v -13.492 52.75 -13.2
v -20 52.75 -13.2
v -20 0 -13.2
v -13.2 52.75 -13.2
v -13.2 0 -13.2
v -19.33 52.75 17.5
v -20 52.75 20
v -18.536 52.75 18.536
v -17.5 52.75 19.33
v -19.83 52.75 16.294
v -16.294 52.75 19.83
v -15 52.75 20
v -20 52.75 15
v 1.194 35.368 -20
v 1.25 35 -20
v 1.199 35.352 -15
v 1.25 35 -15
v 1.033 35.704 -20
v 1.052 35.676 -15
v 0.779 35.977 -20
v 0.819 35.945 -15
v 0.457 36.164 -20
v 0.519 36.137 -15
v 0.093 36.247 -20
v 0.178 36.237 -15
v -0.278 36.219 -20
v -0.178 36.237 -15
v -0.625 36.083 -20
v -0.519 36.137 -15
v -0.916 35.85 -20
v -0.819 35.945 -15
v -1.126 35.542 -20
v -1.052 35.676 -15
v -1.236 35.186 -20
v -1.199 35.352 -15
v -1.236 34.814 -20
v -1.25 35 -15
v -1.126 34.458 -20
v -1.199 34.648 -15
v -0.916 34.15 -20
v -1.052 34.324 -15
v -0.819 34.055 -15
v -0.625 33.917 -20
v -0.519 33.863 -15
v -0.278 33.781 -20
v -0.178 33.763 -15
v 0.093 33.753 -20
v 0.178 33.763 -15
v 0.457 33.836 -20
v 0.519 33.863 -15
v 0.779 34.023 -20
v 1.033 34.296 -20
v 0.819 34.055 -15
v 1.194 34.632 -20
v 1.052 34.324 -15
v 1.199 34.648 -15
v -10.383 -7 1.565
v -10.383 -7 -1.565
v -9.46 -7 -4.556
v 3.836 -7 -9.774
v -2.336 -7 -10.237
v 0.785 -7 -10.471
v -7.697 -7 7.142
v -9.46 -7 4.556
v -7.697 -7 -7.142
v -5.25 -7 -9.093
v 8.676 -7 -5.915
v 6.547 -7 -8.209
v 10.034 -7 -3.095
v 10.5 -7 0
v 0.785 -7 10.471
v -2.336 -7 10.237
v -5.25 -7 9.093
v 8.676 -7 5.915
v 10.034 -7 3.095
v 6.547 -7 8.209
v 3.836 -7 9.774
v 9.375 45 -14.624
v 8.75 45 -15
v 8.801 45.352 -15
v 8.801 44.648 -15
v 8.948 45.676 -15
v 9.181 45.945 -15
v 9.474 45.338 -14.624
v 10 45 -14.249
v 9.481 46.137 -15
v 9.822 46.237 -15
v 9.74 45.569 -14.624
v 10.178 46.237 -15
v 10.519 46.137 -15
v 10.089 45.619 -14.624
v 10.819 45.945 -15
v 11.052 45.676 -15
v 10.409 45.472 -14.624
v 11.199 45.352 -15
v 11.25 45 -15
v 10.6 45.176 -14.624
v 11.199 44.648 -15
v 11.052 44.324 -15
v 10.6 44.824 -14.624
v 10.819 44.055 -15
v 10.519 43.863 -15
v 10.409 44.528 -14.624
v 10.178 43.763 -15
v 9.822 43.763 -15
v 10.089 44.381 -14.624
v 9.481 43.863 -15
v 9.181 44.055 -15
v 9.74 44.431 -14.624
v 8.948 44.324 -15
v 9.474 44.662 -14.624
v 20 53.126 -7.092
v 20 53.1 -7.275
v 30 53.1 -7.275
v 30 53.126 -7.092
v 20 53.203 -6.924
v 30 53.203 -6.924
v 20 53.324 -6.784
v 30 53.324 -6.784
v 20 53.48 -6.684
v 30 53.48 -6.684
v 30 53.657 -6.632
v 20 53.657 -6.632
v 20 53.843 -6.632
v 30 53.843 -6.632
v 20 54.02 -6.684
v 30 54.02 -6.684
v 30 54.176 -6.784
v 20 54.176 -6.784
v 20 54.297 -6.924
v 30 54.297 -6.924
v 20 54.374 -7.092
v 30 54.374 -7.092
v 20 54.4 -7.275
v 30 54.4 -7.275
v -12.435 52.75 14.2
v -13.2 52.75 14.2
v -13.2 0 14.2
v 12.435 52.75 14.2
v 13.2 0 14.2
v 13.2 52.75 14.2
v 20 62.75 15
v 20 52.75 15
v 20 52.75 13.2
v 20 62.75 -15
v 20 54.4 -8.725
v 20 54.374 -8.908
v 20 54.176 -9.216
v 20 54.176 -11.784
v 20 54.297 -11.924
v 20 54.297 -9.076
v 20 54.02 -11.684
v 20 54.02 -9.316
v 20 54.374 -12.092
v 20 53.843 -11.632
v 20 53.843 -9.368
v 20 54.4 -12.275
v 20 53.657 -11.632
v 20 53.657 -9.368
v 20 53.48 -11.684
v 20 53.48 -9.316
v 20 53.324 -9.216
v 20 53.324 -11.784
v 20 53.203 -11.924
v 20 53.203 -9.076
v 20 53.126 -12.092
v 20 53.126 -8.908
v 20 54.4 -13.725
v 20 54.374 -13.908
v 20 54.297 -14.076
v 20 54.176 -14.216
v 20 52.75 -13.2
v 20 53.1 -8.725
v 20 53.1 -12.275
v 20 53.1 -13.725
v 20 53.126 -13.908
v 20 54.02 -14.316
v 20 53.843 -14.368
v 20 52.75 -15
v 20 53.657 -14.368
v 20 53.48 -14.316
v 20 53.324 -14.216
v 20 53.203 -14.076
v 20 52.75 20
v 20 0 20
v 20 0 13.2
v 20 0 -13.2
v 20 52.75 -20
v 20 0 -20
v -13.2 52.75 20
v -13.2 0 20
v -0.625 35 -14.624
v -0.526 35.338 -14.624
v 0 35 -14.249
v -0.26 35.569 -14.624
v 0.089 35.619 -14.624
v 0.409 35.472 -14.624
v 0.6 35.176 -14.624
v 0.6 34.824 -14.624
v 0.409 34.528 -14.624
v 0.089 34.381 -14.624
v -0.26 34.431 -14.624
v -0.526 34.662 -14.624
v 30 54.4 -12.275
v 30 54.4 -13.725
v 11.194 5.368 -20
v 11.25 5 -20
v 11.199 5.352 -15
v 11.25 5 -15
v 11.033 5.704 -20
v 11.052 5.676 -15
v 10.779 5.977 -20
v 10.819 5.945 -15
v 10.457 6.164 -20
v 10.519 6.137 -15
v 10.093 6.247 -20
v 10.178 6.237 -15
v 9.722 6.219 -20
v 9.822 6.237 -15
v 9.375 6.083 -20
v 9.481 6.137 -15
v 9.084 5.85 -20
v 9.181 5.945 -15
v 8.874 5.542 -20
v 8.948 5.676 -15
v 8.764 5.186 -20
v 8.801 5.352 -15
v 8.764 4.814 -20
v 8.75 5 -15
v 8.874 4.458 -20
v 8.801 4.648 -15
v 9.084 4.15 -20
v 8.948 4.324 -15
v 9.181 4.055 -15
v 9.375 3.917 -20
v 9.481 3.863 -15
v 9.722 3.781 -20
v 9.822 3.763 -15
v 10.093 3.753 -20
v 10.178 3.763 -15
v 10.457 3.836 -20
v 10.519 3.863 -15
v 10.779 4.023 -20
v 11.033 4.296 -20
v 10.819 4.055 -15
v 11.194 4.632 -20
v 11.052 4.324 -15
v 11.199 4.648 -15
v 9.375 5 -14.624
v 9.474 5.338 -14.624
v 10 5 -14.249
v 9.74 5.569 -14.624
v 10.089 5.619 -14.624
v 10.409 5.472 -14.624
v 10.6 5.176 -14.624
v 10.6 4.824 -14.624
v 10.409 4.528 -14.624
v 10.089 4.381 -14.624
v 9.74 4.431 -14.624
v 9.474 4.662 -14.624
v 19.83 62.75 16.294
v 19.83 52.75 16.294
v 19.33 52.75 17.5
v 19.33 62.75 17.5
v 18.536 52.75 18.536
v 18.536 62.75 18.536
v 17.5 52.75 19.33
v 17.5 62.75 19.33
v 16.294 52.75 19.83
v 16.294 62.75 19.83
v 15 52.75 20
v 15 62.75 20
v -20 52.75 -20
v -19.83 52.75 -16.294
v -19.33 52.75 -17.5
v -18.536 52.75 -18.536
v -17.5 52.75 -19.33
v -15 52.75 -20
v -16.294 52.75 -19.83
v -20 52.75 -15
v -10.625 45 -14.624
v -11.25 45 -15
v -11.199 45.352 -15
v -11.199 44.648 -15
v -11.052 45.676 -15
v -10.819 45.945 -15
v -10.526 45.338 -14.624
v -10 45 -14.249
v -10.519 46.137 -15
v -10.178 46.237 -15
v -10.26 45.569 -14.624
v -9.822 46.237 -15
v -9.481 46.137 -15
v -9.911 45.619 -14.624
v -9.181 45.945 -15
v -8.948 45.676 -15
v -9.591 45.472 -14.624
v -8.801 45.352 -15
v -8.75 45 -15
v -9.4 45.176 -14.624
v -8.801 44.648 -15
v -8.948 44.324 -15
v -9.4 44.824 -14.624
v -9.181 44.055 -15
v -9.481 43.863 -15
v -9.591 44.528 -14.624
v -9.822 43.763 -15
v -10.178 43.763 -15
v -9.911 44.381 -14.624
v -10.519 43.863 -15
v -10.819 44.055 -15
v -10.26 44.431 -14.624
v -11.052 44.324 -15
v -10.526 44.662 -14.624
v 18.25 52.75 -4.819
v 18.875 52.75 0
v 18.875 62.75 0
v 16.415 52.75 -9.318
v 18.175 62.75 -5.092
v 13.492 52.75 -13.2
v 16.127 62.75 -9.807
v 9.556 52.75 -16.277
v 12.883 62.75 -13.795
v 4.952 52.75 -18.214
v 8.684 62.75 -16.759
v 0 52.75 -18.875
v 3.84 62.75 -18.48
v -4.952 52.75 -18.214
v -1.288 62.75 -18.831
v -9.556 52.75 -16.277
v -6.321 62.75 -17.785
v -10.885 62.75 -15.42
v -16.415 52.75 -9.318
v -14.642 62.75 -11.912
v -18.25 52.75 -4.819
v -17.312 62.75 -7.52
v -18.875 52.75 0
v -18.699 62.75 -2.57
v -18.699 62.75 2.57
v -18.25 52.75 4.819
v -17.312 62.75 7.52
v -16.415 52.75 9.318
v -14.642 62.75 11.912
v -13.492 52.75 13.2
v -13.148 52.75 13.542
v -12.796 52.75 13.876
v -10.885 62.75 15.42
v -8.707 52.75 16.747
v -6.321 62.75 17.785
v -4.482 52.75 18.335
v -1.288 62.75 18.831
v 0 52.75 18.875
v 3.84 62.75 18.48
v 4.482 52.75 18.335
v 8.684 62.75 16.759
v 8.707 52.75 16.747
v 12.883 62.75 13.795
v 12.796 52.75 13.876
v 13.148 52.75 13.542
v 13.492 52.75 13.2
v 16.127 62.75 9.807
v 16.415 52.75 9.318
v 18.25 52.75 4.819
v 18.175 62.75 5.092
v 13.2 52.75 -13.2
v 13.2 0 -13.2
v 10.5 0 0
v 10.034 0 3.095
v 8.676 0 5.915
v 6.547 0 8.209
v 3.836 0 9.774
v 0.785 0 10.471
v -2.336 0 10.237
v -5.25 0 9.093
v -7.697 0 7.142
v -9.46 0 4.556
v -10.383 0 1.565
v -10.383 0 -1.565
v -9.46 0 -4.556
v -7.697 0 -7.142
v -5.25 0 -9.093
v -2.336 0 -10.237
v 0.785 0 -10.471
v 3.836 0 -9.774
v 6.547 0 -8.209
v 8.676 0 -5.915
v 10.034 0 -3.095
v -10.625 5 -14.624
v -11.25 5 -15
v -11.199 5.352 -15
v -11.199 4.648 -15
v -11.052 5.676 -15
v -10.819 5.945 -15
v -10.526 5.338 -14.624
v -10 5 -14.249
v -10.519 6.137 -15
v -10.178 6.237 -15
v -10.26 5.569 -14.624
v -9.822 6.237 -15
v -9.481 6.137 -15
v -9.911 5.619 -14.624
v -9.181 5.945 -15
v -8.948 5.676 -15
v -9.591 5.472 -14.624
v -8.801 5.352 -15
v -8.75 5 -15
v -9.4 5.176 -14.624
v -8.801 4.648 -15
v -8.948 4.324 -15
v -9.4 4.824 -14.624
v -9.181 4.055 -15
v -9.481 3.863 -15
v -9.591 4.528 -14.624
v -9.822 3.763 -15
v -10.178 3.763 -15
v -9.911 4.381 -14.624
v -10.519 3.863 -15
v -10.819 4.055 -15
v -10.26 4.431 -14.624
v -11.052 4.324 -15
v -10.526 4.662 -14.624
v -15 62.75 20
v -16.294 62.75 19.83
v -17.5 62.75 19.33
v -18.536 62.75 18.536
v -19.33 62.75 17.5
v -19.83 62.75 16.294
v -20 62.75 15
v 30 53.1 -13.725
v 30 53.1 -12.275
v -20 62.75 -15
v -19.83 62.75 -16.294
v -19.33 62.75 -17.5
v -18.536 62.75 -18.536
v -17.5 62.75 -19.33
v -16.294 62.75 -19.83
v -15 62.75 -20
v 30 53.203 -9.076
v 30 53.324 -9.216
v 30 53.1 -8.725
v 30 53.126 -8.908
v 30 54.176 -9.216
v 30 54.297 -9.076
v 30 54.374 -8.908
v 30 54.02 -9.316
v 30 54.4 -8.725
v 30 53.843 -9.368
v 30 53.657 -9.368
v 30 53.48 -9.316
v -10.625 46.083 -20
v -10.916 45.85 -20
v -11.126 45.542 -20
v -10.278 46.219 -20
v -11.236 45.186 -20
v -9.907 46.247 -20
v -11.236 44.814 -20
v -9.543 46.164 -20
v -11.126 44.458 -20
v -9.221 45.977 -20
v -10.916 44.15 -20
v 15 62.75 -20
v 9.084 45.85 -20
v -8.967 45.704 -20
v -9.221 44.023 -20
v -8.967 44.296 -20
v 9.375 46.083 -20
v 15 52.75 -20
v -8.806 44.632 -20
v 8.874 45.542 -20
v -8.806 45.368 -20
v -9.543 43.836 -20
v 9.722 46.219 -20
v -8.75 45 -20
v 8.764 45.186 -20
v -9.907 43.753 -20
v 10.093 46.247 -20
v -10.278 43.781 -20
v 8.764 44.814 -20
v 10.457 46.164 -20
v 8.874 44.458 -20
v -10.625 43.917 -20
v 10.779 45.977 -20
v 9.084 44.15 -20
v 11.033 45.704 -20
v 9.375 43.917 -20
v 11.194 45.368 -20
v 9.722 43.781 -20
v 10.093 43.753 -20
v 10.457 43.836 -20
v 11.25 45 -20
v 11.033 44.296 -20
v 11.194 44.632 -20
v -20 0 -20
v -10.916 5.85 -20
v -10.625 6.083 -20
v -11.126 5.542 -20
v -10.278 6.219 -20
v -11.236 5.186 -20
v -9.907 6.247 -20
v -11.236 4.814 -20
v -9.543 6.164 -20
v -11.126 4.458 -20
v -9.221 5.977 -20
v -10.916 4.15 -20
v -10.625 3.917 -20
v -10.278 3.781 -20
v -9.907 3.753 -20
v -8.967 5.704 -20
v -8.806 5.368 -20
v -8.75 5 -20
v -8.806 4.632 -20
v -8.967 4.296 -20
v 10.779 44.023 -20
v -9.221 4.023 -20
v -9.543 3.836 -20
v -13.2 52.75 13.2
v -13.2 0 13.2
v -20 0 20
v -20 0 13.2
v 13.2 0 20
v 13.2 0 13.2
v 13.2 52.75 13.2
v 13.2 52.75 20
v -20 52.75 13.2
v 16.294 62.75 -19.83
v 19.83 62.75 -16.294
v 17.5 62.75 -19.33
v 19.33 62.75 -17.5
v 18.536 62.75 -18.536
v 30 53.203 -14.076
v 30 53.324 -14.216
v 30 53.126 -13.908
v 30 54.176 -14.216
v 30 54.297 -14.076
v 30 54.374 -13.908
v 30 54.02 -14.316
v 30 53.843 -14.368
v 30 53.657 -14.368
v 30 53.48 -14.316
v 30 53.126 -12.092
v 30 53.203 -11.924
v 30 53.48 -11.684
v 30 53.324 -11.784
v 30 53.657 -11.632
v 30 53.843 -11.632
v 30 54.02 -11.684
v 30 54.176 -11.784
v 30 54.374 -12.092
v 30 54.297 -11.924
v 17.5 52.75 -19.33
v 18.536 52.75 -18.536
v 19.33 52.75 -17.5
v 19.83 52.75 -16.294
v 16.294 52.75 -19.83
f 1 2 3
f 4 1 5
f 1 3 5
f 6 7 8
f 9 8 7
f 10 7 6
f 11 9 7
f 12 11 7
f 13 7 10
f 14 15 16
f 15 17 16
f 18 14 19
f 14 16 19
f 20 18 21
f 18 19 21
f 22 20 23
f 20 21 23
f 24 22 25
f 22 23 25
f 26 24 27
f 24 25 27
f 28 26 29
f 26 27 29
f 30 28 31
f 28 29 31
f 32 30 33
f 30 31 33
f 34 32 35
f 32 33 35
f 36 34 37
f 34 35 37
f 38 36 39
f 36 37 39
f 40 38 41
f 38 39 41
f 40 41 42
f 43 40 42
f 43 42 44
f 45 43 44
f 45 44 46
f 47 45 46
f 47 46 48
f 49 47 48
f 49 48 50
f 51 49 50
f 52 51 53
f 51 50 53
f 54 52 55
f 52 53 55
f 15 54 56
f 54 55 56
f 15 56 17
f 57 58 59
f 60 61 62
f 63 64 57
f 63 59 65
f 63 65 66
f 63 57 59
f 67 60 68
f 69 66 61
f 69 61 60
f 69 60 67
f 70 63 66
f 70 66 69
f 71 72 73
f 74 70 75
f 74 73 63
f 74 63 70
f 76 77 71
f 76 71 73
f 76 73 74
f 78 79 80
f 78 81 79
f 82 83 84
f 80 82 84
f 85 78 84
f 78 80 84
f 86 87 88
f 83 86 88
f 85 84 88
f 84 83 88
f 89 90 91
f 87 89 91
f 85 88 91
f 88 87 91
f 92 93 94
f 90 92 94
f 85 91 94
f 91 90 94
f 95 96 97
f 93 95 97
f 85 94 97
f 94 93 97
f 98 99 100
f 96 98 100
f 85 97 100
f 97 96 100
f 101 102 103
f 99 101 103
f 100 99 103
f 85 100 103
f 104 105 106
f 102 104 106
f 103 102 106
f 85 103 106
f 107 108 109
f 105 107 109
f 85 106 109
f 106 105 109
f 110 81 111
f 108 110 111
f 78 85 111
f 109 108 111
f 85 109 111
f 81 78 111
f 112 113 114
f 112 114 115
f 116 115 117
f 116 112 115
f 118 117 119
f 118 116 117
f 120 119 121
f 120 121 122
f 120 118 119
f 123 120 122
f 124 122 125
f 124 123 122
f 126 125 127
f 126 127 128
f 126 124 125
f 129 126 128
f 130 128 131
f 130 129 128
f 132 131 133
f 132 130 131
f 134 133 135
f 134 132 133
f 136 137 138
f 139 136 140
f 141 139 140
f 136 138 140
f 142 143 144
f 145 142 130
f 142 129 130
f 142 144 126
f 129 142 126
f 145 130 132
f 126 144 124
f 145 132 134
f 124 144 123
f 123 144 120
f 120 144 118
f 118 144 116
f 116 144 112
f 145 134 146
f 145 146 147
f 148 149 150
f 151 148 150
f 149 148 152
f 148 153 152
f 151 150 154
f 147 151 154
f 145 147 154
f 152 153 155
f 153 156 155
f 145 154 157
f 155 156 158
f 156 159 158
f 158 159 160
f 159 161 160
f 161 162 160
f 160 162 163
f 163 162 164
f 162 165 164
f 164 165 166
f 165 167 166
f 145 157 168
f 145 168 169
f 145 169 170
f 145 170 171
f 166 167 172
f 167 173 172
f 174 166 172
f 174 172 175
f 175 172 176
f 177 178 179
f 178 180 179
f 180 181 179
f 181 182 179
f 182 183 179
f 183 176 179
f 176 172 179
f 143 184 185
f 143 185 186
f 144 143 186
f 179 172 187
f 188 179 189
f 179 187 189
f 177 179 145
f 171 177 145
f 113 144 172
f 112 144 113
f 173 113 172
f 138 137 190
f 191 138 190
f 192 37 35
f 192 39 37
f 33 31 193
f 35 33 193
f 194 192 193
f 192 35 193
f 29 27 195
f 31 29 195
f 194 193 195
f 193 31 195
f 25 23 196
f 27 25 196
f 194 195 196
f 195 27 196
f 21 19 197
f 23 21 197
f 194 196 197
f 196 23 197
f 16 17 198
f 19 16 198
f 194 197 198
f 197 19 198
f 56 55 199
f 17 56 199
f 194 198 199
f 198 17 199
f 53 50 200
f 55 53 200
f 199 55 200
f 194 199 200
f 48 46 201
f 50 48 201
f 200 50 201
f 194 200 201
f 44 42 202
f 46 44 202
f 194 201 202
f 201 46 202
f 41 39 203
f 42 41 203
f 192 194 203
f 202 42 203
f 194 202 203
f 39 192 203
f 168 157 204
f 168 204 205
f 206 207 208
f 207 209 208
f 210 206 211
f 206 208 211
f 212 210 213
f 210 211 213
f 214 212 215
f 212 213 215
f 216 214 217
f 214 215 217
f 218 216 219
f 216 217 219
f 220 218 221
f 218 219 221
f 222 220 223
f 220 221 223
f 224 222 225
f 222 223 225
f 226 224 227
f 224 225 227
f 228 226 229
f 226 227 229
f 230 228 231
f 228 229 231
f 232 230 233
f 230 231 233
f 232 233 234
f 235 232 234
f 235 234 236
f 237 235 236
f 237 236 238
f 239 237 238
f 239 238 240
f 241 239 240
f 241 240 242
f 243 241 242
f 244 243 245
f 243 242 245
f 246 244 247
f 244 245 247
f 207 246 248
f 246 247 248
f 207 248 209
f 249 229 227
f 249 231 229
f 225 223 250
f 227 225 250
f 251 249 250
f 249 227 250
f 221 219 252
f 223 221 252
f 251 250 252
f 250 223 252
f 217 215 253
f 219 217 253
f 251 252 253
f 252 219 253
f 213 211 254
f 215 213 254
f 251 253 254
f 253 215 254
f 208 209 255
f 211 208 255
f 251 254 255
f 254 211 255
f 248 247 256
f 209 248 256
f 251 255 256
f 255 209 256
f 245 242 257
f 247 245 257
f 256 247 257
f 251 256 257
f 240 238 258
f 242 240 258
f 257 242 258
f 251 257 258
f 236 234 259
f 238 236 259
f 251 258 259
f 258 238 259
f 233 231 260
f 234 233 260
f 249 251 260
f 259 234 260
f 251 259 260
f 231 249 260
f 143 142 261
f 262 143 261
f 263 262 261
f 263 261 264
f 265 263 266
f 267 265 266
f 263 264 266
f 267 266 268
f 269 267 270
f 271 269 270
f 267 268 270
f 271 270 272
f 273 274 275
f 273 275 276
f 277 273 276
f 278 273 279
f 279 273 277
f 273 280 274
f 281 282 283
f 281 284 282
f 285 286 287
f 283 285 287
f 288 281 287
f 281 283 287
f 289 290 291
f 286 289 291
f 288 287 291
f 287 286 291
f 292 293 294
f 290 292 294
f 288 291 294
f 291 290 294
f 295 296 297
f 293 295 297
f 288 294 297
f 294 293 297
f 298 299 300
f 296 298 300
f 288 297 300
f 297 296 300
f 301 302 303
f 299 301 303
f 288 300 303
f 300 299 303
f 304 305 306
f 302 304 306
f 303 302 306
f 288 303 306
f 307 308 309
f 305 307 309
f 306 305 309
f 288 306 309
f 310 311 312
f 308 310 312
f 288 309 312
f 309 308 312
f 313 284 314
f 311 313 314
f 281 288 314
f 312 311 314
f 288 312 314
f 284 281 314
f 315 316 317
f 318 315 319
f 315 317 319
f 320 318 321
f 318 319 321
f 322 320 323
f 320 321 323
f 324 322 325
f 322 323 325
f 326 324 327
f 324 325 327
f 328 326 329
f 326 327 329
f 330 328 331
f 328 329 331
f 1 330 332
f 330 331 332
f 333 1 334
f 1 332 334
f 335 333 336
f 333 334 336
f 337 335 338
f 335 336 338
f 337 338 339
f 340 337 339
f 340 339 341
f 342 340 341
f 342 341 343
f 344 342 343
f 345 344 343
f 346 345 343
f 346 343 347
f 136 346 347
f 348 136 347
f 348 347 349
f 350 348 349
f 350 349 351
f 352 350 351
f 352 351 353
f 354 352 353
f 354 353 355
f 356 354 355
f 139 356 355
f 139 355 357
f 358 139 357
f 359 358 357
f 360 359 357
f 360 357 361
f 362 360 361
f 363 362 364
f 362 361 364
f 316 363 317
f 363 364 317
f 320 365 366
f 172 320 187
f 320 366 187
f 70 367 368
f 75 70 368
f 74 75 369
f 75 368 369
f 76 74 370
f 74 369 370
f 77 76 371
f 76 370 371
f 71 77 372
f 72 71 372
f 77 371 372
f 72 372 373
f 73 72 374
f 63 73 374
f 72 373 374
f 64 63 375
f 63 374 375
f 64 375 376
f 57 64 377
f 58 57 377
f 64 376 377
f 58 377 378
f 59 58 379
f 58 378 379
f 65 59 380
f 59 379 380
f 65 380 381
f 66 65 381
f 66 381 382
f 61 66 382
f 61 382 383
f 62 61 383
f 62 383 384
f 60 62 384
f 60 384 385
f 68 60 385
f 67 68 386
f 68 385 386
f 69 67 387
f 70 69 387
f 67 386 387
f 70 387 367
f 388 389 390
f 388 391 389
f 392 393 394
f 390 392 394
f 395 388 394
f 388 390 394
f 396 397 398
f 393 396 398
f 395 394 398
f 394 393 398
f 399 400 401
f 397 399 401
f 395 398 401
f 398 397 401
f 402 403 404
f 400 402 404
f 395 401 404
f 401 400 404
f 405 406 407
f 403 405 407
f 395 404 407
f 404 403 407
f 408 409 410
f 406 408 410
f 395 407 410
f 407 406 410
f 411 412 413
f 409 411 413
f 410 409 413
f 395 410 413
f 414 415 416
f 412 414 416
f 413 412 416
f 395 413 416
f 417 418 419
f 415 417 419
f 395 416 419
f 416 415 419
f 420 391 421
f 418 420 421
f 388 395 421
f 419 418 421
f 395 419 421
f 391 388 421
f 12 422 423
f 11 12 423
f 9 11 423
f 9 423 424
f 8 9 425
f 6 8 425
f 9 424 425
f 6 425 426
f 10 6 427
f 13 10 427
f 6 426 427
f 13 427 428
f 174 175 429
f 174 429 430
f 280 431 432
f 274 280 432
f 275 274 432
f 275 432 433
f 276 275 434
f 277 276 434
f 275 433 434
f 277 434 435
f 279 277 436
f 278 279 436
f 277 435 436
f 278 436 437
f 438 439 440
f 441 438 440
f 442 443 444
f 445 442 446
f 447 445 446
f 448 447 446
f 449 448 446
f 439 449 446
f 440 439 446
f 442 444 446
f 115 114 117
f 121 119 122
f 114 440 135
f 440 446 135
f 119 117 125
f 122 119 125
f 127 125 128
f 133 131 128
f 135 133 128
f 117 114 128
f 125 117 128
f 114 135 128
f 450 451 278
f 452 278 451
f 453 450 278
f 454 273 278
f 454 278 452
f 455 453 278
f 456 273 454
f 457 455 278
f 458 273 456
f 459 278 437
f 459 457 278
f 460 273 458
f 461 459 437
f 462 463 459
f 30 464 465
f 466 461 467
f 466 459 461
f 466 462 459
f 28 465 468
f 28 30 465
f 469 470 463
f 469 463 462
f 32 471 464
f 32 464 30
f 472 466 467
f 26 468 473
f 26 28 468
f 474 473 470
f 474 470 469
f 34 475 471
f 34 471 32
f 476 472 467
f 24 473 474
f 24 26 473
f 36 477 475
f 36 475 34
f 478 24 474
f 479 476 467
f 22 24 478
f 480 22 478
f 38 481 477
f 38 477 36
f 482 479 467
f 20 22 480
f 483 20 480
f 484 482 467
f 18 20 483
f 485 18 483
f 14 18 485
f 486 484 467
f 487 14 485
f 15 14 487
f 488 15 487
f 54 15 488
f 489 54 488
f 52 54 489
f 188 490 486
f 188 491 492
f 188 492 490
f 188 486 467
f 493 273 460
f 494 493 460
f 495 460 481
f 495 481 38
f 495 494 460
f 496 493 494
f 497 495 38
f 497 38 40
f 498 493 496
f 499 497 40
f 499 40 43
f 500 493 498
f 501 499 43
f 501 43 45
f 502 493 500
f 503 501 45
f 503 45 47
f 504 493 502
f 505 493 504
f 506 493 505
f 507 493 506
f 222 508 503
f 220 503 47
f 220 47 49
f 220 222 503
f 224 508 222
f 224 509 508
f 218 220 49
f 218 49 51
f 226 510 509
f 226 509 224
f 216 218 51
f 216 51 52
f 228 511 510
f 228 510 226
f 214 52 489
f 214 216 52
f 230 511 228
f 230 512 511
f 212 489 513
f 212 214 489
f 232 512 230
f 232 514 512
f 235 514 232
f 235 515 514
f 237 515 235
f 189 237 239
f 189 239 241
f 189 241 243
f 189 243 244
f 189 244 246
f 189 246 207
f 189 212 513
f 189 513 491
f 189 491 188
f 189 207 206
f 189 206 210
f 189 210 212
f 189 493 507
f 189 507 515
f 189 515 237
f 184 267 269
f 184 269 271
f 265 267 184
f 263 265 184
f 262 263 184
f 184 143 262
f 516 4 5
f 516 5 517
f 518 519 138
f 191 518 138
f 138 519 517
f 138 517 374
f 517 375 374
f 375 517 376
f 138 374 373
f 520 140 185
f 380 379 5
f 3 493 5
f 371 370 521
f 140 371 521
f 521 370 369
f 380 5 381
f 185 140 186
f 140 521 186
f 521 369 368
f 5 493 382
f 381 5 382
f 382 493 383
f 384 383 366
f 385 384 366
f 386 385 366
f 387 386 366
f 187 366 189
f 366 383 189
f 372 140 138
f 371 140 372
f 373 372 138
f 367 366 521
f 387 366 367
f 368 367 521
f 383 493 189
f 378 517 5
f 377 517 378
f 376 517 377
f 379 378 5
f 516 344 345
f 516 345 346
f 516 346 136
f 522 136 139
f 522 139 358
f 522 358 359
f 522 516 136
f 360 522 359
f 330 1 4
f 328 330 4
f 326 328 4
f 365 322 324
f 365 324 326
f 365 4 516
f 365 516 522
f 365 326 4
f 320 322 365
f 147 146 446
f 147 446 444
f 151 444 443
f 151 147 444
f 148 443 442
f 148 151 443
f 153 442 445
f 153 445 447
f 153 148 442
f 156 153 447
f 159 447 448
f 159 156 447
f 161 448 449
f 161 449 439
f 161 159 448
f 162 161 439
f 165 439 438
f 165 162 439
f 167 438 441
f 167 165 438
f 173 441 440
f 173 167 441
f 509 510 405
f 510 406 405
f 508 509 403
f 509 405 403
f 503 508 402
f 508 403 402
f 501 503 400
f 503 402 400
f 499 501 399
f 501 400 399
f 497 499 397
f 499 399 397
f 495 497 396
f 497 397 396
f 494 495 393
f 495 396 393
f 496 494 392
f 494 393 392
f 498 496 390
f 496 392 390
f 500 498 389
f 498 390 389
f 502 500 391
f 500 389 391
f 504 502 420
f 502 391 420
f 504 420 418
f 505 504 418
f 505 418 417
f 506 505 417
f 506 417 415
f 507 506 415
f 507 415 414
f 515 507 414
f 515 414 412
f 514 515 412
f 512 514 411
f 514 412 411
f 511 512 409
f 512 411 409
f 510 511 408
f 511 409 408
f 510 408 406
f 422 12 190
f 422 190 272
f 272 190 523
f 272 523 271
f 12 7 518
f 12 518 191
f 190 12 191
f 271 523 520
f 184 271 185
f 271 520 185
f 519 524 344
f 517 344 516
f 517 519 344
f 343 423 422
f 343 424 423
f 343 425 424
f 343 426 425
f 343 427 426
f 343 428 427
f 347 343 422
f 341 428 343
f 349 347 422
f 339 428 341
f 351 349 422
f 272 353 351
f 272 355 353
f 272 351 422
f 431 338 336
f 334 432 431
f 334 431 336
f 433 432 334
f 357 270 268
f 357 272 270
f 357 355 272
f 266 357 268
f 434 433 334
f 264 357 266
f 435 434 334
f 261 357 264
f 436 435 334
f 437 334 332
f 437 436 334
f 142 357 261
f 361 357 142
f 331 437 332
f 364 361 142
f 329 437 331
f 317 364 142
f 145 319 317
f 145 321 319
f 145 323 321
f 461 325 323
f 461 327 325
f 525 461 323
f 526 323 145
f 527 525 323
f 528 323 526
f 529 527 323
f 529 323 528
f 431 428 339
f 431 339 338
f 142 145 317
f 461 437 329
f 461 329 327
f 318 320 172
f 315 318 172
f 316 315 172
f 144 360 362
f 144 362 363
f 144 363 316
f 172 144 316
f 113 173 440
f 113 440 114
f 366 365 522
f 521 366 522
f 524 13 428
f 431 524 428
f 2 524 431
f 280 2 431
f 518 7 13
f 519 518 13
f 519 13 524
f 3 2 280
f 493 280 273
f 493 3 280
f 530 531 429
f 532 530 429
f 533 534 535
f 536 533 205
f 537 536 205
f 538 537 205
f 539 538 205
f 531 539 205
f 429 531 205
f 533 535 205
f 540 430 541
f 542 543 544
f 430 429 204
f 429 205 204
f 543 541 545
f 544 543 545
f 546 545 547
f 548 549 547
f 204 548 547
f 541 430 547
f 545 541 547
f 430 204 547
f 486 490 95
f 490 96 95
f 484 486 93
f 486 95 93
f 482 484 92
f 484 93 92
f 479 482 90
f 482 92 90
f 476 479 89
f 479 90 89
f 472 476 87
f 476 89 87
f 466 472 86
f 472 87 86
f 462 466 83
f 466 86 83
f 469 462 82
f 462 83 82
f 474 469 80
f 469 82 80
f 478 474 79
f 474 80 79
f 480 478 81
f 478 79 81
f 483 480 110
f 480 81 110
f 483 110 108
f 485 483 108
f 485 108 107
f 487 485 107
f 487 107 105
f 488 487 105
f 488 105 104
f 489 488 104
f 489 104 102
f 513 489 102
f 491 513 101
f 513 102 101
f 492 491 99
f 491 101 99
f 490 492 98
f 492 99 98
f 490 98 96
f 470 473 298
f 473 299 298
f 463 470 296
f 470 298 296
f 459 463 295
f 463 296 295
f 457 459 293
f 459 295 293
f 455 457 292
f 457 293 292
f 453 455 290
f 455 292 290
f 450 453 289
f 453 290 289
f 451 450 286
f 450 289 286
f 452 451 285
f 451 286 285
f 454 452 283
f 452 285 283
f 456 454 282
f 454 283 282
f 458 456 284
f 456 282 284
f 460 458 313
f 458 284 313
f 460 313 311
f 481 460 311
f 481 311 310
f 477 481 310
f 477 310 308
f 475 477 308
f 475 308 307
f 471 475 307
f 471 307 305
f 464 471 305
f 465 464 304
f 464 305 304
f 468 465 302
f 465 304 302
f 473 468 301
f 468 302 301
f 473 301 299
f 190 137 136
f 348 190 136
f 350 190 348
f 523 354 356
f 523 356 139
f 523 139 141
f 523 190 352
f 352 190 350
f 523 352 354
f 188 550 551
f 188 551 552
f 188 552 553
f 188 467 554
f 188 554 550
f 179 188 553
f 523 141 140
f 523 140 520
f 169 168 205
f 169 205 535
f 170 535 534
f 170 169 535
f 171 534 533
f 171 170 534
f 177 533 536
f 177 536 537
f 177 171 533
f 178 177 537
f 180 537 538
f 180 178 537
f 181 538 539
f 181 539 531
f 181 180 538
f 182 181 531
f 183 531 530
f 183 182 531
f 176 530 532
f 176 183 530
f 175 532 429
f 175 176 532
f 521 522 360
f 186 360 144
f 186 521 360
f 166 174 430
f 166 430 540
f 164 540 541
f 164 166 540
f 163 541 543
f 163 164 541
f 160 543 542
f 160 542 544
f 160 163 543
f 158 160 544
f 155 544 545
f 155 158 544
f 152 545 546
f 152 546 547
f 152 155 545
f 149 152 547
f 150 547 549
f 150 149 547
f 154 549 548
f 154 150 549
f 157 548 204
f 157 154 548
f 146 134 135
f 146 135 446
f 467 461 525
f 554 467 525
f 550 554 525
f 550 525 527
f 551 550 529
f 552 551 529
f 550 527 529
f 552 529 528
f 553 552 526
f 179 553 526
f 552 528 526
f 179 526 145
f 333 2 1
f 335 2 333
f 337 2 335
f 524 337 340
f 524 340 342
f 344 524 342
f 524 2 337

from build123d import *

# Parameters (mm, degrees)
SKETCH1_W                 = 40
SKETCH1_H                 = 40
BOSS_EXTRUDE1_DEPTH       = 62.75
SKETCH2_R                 = 18.875
CUT_EXTRUDE1_DEPTH        = 10
SKETCH4_R                 = 10.5
BOSS_EXTRUDE2_DEPTH       = 7
SKETCH5_W                 = 26.4
SKETCH5_H                 = 5.8
SKETCH5_W_2               = 6.8
SKETCH5_H_2               = 26.4
CUT_EXTRUDE2_DEPTH        = 52.75
M3X0_5_TAPPED_HOLE1_D     = 2.5
M3X0_5_TAPPED_HOLE1_DEPTH = 5
M3X0_5_TAPPED_HOLE1_TIP   = 0.751075774
BOSS_EXTRUDE3_DEPTH       = 10


with BuildPart() as part:
    # Sketch1 → Boss-Extrude1 (new body)
    with BuildSketch(Plane(origin=(0, 0, 0), x_dir=(1, 0, 0), z_dir=(0, 1, 0))):
        Rectangle(SKETCH1_W, SKETCH1_H)
    extrude(amount=BOSS_EXTRUDE1_DEPTH)

    # Sketch2 → Cut-Extrude1 (cut)
    with BuildSketch(Plane(origin=(0, 62.75, 0), x_dir=(1, 0, 0), z_dir=(0, 1, 0))):
        Circle(SKETCH2_R)
        with BuildLine():
            ThreePointArc((-15, -20), (-18.535533906, -18.535533906), (-20, -15))
            Line((-20, -15), (-20, -20))
            Line((-20, -20), (-15, -20))
        make_face()
        with BuildLine():
            ThreePointArc((20, -15), (18.535533906, -18.535533906), (15, -20))
            Line((15, -20), (20, -20))
            Line((20, -20), (20, -15))
        make_face()
        with BuildLine():
            Line((20, 20), (15, 20))
            ThreePointArc((15, 20), (18.535533906, 18.535533906), (20, 15))
            Line((20, 15), (20, 20))
        make_face()
        with BuildLine():
            Line((-15, 20), (-20, 20))
            Line((-20, 20), (-20, 15))
            ThreePointArc((-20, 15), (-18.535533906, 18.535533906), (-15, 20))
        make_face()
    extrude(amount=-CUT_EXTRUDE1_DEPTH, mode=Mode.SUBTRACT)

    # Sketch4 → Boss-Extrude2 (add)
    with BuildSketch(Plane.XZ):
        Circle(SKETCH4_R)
    extrude(amount=BOSS_EXTRUDE2_DEPTH)

    # Sketch5 → Cut-Extrude2 (cut)
    with BuildSketch(Plane.XZ):
        with Locations((0, 17.1)):
            Rectangle(SKETCH5_W, SKETCH5_H)
        with Locations((16.6, 0)):
            Rectangle(SKETCH5_W_2, SKETCH5_H_2)
        with Locations((-16.6, 0)):
            Rectangle(SKETCH5_W_2, SKETCH5_H_2)
    extrude(amount=-CUT_EXTRUDE2_DEPTH, mode=Mode.SUBTRACT)

    # M3x0.5 Tapped Hole1
    with Locations(Plane(origin=(0, 0, -20), x_dir=(-1, 0, 0), z_dir=(0, 0, -1))):
        with Locations((-10, 45), (10, 45), (10, 5), (-10, 5), (0, 35)):
            Hole(M3X0_5_TAPPED_HOLE1_D / 2, depth=M3X0_5_TAPPED_HOLE1_DEPTH)
            with Locations((0, 0, -(M3X0_5_TAPPED_HOLE1_DEPTH + M3X0_5_TAPPED_HOLE1_TIP / 2))):  # 118° drill point
                Cone(0, M3X0_5_TAPPED_HOLE1_D / 2, M3X0_5_TAPPED_HOLE1_TIP, mode=Mode.SUBTRACT)

    # Sketch9 → Boss-Extrude3 (add)
    with BuildSketch(Plane(origin=(20, 0, 0), x_dir=(0, 0, -1), z_dir=(1, 0, 0))):
        with BuildLine():
            Line((7.275, 54.4), (8.725, 54.4))
            ThreePointArc((8.725, 54.4), (9.375, 53.75), (8.725, 53.1))
            Line((8.725, 53.1), (7.275, 53.1))
            ThreePointArc((7.275, 53.1), (6.625, 53.75), (7.275, 54.4))
        make_face()
        with BuildLine():
            Line((12.275, 54.4), (13.725, 54.4))
            ThreePointArc((13.725, 54.4), (14.375, 53.75), (13.725, 53.1))
            Line((13.725, 53.1), (12.275, 53.1))
            ThreePointArc((12.275, 53.1), (11.625, 53.75), (12.275, 54.4))
        make_face()
    extrude(amount=BOSS_EXTRUDE3_DEPTH)


solid = part.part
